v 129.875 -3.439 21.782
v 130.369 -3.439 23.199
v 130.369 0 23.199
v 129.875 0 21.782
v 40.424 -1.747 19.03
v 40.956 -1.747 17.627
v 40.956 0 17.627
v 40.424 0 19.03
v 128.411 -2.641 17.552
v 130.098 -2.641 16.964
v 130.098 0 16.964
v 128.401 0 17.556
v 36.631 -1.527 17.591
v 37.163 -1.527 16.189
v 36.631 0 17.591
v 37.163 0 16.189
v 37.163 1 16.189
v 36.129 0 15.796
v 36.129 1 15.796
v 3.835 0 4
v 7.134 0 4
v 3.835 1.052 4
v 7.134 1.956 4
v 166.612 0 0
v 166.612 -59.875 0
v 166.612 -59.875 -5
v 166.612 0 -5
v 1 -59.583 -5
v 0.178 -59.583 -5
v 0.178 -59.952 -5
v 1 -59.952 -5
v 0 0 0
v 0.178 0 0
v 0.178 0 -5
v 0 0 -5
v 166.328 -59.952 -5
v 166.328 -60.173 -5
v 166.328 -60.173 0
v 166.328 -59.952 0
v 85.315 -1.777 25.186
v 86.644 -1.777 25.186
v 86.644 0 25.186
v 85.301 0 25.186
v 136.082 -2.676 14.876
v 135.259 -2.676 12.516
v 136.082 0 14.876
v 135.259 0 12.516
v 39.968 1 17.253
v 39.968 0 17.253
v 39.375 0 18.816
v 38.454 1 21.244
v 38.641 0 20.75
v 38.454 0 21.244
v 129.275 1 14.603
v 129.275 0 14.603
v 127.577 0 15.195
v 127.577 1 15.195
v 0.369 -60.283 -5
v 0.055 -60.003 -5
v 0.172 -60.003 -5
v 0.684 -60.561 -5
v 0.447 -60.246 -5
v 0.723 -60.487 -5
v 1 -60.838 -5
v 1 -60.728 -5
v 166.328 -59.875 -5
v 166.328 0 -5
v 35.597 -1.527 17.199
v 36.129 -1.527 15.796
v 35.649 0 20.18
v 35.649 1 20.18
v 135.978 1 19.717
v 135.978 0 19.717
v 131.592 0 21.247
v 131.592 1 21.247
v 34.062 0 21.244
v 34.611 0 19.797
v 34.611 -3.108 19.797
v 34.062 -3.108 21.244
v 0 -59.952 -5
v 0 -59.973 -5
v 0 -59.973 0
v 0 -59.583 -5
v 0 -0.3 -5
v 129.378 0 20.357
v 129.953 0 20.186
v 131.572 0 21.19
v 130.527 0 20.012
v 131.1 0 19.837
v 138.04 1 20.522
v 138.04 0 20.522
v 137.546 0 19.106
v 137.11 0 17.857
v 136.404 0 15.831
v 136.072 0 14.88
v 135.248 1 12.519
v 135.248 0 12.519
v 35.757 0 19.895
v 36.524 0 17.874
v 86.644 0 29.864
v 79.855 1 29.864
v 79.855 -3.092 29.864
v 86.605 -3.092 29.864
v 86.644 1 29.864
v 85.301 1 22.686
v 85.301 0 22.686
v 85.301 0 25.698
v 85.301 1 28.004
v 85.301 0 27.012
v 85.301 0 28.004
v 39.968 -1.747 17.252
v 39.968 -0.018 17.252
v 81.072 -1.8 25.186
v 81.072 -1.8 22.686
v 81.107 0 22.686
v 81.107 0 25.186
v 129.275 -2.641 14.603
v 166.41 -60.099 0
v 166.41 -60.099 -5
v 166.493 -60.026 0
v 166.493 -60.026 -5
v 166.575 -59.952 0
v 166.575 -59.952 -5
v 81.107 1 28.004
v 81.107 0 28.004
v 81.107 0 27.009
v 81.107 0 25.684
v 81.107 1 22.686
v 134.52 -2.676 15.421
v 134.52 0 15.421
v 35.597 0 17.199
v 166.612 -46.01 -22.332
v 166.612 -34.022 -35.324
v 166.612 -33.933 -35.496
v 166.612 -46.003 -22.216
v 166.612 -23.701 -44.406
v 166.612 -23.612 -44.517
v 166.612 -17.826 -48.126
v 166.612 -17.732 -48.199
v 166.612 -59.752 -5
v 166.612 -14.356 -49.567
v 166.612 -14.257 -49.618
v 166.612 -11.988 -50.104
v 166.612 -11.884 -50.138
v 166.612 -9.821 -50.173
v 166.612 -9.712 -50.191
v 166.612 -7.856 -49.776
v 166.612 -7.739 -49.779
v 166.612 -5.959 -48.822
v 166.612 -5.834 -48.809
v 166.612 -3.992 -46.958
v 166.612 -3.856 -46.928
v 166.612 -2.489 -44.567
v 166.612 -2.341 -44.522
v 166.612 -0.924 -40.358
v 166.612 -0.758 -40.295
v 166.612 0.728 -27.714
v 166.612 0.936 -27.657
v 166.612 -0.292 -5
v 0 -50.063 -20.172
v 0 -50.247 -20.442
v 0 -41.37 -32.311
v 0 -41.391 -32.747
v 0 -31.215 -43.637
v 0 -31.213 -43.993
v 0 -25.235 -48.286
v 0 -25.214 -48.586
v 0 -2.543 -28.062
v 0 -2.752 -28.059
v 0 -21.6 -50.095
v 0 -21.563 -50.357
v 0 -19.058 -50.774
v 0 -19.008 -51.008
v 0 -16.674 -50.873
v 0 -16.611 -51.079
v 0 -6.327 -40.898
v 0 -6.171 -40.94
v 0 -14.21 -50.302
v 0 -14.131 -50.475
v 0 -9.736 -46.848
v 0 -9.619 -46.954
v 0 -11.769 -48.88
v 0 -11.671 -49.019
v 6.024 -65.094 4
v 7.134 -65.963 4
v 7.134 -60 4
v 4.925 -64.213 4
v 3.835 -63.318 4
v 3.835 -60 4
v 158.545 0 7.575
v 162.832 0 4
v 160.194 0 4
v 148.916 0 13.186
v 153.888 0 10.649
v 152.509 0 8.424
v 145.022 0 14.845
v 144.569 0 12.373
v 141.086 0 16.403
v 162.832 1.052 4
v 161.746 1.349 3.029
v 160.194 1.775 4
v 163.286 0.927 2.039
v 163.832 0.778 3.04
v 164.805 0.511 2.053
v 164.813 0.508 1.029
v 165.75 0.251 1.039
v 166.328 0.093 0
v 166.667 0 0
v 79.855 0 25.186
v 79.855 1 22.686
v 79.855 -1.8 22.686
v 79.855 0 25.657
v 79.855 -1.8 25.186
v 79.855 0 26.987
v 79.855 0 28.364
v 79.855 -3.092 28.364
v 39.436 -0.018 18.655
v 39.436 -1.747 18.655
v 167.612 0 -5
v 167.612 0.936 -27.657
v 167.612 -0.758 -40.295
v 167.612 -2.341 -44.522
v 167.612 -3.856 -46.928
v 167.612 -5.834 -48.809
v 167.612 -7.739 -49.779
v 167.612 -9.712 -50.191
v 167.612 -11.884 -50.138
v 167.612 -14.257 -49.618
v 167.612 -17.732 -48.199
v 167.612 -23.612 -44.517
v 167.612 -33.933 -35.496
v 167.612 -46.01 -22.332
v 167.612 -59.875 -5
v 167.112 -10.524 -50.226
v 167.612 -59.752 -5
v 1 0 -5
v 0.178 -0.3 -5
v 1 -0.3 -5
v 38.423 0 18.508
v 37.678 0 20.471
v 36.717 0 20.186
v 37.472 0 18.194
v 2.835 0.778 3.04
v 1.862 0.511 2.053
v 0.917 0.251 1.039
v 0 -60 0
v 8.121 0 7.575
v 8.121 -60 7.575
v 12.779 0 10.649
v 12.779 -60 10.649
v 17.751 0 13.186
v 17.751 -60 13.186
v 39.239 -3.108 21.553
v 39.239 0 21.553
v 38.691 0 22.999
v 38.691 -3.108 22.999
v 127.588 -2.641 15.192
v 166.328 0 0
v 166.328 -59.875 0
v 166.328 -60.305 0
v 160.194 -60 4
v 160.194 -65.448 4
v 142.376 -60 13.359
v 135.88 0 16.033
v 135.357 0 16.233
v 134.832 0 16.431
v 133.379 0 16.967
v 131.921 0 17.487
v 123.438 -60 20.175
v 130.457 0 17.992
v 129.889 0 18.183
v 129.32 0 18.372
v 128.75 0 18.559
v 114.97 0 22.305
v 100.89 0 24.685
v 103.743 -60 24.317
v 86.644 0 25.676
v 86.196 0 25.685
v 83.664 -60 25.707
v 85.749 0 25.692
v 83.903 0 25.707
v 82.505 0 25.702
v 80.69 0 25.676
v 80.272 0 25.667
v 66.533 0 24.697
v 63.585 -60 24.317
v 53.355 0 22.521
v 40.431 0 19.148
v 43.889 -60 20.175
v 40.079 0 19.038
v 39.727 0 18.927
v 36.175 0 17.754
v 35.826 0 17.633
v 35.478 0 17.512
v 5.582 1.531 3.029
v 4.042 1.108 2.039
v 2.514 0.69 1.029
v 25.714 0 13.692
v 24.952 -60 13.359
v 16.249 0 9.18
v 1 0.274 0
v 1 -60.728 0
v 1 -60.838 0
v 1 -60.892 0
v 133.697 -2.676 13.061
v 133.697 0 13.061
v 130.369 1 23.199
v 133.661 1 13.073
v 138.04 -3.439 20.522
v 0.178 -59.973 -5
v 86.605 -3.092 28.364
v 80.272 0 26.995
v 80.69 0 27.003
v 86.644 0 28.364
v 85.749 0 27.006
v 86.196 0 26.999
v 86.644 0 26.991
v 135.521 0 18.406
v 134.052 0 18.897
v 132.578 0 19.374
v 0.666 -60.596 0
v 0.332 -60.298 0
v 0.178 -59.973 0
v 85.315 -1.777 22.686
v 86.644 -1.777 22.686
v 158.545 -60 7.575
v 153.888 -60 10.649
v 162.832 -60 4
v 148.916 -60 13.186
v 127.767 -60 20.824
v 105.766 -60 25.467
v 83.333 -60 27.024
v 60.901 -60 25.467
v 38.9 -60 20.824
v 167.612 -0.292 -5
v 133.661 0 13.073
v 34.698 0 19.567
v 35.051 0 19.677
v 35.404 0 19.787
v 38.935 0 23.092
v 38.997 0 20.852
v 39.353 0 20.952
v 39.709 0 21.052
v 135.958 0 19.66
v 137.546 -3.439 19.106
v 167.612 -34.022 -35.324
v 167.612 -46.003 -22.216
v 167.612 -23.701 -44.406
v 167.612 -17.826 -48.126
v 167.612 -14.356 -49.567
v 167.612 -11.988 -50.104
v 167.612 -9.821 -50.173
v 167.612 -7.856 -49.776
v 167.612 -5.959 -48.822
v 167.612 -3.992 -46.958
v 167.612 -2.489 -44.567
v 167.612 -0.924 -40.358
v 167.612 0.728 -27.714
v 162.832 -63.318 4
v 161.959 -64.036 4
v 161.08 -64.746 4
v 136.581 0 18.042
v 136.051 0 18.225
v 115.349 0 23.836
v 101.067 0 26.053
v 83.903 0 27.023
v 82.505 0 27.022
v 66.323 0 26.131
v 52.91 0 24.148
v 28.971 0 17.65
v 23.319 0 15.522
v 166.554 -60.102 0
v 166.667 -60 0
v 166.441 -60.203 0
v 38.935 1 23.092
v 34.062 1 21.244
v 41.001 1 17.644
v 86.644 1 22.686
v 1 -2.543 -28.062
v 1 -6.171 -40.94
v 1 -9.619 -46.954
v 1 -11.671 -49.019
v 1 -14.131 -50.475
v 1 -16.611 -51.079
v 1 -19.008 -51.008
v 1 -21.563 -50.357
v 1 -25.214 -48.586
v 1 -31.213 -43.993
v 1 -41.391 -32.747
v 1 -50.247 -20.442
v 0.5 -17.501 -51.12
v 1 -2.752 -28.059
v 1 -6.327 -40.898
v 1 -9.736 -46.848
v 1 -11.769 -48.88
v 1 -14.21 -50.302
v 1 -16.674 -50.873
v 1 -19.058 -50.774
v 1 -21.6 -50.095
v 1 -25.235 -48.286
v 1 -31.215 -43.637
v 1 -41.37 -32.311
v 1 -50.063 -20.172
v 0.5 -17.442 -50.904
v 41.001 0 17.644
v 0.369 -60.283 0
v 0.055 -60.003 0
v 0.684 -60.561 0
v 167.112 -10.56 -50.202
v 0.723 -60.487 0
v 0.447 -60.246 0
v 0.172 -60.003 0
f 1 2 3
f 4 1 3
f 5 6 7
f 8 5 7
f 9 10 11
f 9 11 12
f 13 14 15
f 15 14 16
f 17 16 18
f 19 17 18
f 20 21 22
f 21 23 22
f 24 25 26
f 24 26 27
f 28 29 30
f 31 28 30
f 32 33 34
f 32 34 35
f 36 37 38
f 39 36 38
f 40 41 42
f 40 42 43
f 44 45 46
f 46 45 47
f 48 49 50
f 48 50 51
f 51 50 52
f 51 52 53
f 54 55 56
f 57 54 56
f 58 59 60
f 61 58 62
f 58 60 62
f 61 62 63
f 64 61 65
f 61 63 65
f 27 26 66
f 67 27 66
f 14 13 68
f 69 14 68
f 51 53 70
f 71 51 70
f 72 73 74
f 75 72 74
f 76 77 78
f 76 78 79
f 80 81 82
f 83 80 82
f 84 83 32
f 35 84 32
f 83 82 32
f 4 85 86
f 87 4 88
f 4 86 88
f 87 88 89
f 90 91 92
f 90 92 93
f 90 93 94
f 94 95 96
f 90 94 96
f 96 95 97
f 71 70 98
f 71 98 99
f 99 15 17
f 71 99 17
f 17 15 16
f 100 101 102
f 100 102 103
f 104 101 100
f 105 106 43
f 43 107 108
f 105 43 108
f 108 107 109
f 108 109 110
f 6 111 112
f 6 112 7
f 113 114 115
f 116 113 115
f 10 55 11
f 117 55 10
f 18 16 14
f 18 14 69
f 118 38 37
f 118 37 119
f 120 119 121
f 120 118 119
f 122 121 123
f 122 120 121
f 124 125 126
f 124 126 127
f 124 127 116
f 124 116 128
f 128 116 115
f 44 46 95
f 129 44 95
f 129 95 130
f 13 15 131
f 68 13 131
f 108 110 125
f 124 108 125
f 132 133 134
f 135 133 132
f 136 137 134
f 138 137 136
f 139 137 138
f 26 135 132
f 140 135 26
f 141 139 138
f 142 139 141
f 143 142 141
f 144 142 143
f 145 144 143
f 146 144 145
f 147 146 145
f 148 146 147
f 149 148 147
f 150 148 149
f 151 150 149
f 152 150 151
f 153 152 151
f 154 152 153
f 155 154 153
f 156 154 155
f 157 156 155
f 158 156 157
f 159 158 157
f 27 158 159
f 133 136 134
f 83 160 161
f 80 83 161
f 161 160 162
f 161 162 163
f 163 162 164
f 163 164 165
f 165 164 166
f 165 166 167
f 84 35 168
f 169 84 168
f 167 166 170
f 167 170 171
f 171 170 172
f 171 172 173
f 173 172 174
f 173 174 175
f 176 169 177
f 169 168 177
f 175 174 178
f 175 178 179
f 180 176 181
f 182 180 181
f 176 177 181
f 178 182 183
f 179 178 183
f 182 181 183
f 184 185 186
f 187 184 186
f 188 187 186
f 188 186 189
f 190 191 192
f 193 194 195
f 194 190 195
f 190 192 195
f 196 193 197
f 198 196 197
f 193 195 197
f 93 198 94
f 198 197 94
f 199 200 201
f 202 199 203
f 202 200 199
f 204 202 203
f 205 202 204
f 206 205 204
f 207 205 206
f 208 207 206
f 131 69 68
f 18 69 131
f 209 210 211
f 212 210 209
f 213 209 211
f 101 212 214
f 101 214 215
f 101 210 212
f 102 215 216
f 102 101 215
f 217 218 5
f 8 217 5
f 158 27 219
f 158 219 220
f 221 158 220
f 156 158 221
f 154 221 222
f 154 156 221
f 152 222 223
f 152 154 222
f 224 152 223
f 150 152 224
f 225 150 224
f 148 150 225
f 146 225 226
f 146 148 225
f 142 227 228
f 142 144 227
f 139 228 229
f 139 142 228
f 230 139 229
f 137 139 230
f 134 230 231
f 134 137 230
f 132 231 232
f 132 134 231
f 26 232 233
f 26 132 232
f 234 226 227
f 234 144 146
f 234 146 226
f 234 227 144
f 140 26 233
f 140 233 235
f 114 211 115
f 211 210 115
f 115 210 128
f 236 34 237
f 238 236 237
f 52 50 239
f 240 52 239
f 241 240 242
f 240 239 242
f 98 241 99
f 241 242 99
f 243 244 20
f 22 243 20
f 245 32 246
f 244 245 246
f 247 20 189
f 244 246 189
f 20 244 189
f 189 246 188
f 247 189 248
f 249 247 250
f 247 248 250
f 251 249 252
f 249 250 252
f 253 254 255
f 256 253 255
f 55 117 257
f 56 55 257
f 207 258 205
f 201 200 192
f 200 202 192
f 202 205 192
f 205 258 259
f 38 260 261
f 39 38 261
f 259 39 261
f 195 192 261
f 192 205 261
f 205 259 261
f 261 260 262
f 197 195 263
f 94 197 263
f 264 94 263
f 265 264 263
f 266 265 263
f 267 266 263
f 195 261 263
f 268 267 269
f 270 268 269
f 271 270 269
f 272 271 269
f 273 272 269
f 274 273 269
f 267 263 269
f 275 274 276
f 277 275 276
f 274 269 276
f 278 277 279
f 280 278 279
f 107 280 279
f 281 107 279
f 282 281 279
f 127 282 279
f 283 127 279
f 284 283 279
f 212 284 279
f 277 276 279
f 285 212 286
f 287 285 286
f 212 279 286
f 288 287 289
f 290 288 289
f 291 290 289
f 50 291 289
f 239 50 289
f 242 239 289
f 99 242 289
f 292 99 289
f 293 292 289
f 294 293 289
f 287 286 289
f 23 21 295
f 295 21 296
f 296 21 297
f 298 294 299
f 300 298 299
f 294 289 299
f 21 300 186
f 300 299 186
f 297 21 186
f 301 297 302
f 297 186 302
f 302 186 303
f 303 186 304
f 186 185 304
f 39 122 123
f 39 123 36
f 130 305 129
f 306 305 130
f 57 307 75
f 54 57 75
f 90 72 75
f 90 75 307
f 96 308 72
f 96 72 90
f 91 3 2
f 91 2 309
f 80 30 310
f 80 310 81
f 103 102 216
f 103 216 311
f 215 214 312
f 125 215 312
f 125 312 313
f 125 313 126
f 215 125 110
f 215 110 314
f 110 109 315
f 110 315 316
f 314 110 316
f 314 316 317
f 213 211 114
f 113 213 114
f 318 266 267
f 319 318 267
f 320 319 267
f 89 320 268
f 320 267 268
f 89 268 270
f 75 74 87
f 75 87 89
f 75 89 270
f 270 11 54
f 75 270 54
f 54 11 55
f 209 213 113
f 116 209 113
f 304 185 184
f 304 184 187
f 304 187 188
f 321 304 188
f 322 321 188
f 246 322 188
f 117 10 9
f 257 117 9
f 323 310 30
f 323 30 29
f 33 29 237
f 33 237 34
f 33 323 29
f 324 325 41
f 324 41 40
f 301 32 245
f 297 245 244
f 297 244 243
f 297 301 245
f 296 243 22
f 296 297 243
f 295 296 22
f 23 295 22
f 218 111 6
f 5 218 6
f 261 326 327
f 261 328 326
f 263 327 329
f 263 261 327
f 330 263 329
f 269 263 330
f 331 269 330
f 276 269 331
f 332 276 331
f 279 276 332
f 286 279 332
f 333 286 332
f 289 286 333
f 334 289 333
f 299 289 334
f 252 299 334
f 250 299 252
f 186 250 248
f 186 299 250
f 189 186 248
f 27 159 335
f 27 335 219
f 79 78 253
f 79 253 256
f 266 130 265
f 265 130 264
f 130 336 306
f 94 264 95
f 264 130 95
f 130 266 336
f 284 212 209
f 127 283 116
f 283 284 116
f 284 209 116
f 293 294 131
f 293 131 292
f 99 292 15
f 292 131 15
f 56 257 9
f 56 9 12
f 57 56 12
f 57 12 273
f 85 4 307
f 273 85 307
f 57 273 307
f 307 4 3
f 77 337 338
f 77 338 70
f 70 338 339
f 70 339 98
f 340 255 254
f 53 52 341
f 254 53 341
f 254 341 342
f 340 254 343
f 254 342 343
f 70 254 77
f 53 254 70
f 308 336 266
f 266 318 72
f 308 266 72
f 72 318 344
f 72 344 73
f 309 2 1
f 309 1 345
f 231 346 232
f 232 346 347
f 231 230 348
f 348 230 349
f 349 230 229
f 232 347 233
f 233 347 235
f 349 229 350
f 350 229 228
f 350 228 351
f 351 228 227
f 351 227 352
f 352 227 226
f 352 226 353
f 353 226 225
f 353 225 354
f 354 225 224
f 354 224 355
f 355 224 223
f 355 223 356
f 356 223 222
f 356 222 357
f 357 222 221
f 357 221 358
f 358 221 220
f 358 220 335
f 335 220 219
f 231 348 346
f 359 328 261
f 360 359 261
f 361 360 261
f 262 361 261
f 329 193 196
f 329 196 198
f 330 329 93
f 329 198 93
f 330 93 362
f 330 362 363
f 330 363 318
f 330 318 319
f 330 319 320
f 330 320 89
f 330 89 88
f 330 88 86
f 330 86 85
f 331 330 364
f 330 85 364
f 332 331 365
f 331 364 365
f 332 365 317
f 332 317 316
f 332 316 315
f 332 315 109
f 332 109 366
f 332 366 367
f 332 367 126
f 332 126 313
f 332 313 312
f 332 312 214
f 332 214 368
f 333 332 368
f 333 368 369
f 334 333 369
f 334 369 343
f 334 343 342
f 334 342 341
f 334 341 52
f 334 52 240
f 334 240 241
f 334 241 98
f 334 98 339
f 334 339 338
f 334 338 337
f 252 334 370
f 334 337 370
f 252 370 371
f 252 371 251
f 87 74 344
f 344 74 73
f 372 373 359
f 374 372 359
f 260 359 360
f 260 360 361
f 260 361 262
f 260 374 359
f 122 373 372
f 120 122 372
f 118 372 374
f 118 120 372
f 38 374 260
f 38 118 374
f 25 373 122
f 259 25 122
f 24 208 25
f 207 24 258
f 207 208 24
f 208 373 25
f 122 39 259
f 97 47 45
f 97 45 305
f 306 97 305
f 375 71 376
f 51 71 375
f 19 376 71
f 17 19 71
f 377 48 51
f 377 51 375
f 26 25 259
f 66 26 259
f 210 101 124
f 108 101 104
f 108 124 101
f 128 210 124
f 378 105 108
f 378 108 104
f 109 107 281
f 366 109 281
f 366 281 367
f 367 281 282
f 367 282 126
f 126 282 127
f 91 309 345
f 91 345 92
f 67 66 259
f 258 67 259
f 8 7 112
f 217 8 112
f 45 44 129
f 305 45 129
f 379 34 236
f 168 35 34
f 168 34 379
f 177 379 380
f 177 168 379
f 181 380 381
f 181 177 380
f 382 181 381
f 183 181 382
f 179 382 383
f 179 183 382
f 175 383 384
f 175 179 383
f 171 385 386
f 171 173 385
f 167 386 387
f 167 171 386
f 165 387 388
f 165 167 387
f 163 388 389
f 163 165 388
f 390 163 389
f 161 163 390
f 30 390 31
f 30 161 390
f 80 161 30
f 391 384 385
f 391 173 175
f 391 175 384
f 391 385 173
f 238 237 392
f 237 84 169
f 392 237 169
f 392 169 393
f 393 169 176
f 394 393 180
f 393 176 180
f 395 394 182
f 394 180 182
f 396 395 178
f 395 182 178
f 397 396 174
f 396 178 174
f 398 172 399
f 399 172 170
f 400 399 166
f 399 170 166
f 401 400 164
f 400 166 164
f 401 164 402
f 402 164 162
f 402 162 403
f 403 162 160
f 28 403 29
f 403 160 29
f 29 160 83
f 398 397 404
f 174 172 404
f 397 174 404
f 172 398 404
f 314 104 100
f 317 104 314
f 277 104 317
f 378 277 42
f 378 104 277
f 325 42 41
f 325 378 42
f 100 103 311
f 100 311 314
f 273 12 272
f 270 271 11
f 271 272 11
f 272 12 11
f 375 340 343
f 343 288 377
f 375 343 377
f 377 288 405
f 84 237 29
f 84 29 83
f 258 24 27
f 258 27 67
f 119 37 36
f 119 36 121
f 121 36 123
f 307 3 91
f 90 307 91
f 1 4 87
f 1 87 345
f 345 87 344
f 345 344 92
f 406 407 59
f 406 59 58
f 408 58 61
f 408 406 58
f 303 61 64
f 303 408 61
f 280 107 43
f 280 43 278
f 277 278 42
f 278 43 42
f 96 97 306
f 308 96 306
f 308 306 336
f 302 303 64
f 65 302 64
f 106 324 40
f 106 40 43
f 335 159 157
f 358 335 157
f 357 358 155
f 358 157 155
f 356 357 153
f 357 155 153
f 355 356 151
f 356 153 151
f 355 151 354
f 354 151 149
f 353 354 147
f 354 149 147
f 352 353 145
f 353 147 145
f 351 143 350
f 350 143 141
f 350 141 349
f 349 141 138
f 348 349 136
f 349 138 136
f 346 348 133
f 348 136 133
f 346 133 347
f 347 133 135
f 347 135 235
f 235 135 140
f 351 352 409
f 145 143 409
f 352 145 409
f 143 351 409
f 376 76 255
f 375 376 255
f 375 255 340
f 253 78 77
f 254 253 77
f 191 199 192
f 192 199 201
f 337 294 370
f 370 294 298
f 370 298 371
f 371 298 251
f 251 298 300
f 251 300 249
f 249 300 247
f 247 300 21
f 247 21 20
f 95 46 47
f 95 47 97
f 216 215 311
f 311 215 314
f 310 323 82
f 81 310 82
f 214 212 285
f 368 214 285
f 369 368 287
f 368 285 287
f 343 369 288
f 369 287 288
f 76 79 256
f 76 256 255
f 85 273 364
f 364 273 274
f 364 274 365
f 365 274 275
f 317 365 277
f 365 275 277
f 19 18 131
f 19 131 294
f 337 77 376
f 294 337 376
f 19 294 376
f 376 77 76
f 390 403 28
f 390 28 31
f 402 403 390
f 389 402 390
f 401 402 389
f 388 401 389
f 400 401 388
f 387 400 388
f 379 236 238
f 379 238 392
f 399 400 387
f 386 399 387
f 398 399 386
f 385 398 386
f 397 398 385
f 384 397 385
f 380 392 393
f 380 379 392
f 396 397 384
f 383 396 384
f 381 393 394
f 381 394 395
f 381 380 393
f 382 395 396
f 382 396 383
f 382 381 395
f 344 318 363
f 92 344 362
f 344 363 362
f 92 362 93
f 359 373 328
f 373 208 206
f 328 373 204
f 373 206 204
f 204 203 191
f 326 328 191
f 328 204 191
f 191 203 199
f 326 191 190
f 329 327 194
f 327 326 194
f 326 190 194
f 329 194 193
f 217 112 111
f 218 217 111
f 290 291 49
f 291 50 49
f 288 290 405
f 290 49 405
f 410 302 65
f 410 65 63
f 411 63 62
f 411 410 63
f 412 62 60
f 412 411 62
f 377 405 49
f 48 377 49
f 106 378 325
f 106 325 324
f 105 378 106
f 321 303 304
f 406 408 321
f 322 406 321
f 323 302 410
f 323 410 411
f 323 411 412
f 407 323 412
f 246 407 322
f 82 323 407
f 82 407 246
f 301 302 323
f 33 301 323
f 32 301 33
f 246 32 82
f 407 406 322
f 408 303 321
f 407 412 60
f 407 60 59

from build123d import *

# Parameters (mm, degrees)
SALIENTE_EXTRUIR1_DEPTH    = 4
SALIENTE_EXTRUIR2_DEPTH    = 60
CROQUIS3_W                 = 0.289029692
CROQUIS3_H                 = 59.87540196
CROQUIS3_W_2               = 0.177592091
CROQUIS3_H_2               = 59.973158088
SALIENTE_EXTRUIR3_DEPTH    = 5
SALIENTE_EXTRUIR4_DEPTH    = 5
REDONDEO1_R                = 50
REDONDEO2_R                = 50
SALIENTE_EXTRUIR5_DEPTH    = 1
SALIENTE_EXTRUIR6_DEPTH    = 1
CORTAR_EXTRUIR6_DEPTH      = 100
CORTAR_EXTRUIR6_DEPTH_BACK = 100
SALIENTE_EXTRUIR8_DEPTH    = 1
CROQUIS14_W                = 1.546959861
CROQUIS14_H                = 3.108298136
SALIENTE_EXTRUIR9_DEPTH    = 4.95
CROQUIS17_W                = 1.106278156
CROQUIS17_H                = 1.527135833
SALIENTE_EXTRUIR10_DEPTH   = 1.5
SALIENTE_EXTRUIR11_DEPTH   = 1.5
SALIENTE_EXTRUIR20_DEPTH   = 1
SALIENTE_EXTRUIR21_DEPTH   = 2.5
SALIENTE_EXTRUIR22_DEPTH   = 2.5
SALIENTE_EXTRUIR23_DEPTH   = 1.5
SALIENTE_EXTRUIR24_DEPTH   = 1
CROQUIS25_W                = 8.124604313
CROQUIS25_H                = 3.439267379
SALIENTE_EXTRUIR26_DEPTH   = 1.5
CROQUIS26_W                = 1.653966606
CROQUIS26_H                = 2.676005595
SALIENTE_EXTRUIR27_DEPTH   = 2.5
SALIENTE_EXTRUIR28_DEPTH   = 2.5


with BuildPart() as part:
    # Croquis1 → Saliente-Extruir1 (new body)
    with BuildSketch(Plane.XY):
        with BuildLine():
            Line((0, 0), (83.333477934, 22.852667115))
            Line((83.333477934, 22.852667115), (166.666955868, 0))
            Line((166.666955868, 0), (166.666955868, -60))
            ThreePointArc((166.666955868, -60), (83.333477934, -92.017871072), (0, -60))
            Line((0, -60), (0, 0))
        make_face()
    extrude(amount=SALIENTE_EXTRUIR1_DEPTH)

    # Croquis2 → Saliente-Extruir2 (add)
    with BuildSketch(Plane(origin=(0, 0, 0), x_dir=(1, 0, 0), z_dir=(0, 1, 0))):
        with BuildLine():
            Line((0, -4), (166.666955868, -4))
            ThreePointArc((166.666955868, -4), (83.333477934, -27.024341585), (0, -4))
        make_face()
    extrude(amount=-SALIENTE_EXTRUIR2_DEPTH)

    # Croquis3 → Saliente-Extruir3 (add)
    with BuildSketch(Plane(origin=(0, 0, 0), x_dir=(-1, 0, 0), z_dir=(0, 0, -1))):
        with Locations((-166.467895628, -29.93770098)):
            Rectangle(CROQUIS3_W, CROQUIS3_H)
        with Locations((-0.088843275, -29.986579044)):
            Rectangle(CROQUIS3_W_2, CROQUIS3_H_2)
    extrude(amount=SALIENTE_EXTRUIR3_DEPTH)

    # Croquis4 → Saliente-Extruir4 (add)
    with BuildSketch(Plane(origin=(0, 0, 0), x_dir=(-1, 0, 0), z_dir=(0, 0, -1))):
        with BuildLine():
            Line((-166.575051433, -59.952097452), (-166.327771804, -59.952097452))
            ThreePointArc((-166.327771804, -59.952097452), (-83.259391035, -91.42682448), (-0.171692336, -60.003128804))
            Line((-0.171692336, -60.003128804), (-0.054856283, -60.003128804))
            ThreePointArc((-0.054856283, -60.003128804), (-83.324689996, -91.747566021), (-166.575051433, -59.952097452))
        make_face()
    extrude(amount=SALIENTE_EXTRUIR4_DEPTH)

    # Redondeo1
    # the kernel refuses this fillet: 50 mm, written as the material it takes off along each edge
    with BuildSketch(Plane(origin=(166.666955868, 49.966304068, 4), x_dir=(0, 0, -1), z_dir=(0, -1, 0))) as redondeo1_piece_1:
        with BuildLine():
            CenterArc((36.551638367, -37.952481337), REDONDEO1_R, 130.619513434, 25.549773404)
            Line((-9.185522516, -17.750696405), (-10.100265733, -17.346660707))
            ThreePointArc((-10.100265733, -17.346660707), (-5.754361432, -8.274250403), (-0.858153989, 0.513392375))
            Line((-0.858153989, 0.513392375), (0, 1))
            ThreePointArc((0, 1), (2, 1), (3.348967233, 0.759049627))
            Line((3.348967233, 0.759049627), (4, 0))
        make_face()
    extrude(amount=159.932608137, mode=Mode.SUBTRACT)

    # Redondeo2
    # the kernel refuses this fillet: 50 mm, written as the material it takes off along each edge
    with BuildSketch(Plane(origin=(0, -109.966304068, 4), x_dir=(0, 0, -1), z_dir=(0, 1, 0))) as redondeo2_piece_1:
        with BuildLine():
            CenterArc((36.551638367, -37.952481337), REDONDEO2_R, 130.619513434, 25.549773404)
            Line((-9.185522516, -17.750696405), (-10.100265733, -17.346660707))
            ThreePointArc((-10.100265733, -17.346660707), (-5.754361432, -8.274250403), (-0.858153989, 0.513392375))
            Line((-0.858153989, 0.513392375), (0, 1))
            ThreePointArc((0, 1), (2, 1), (3.348967233, 0.759049627))
            Line((3.348967233, 0.759049627), (4, 0))
        make_face()
    extrude(amount=159.932608137, mode=Mode.SUBTRACT)

    # Croquis6 → Saliente-Extruir5 (add)
    with BuildSketch(Plane(origin=(0, 0, 0), x_dir=(0, 0, -1), z_dir=(1, 0, 0))):
        with BuildLine():
            Line((5, 0), (5, -0.29960532))
            add(Edge.make_bspline(
                [(5, -0.29960532), (96.808979423, -4.943573918), (5, -59.582645774)],
                knots=[0, 0, 0, 1, 1, 1], degree=2))
            Line((5, -59.582645774), (5, -59.952097452))
            add(Edge.make_bspline(
                [(5, 0), (97.240633966, -5.026465085), (5, -59.952097452)],
                knots=[0, 0, 0, 1, 1, 1], degree=2))
        make_face()
    extrude(amount=SALIENTE_EXTRUIR5_DEPTH)

    # Croquis9 → Cortar-Extruir6 (cut, two sides: drawn at the far end of the back side and taken through both)
    with BuildSketch(Plane(origin=(0, 0, 0), x_dir=(1, 0, 0), z_dir=(0, 1, 0)).offset(-CORTAR_EXTRUIR6_DEPTH_BACK)):
        with BuildLine():
            Line((1, 5), (166.327771804, 5))
            Line((166.327771804, 5), (166.327771804, 0))
            ThreePointArc((166.327771804, 0), (83.663885902, -25.706781267), (1, 0))
            Line((1, 0), (1, 5))
        make_face()
    extrude(amount=CORTAR_EXTRUIR6_DEPTH + CORTAR_EXTRUIR6_DEPTH_BACK, mode=Mode.SUBTRACT)

    # Croquis11 → Saliente-Extruir8 (add)
    with BuildSketch(Plane(origin=(0, 0, 0), x_dir=(1, 0, 0), z_dir=(0, 1, 0))):
        Polygon((36.128583572, -15.796167366), (34.062264647, -21.243735439), (38.935063324, -23.092038385), (41.001382248, -17.644470312), (39.968222786, -17.25258224), (38.45433709, -21.243735439), (35.649065215, -20.179666797), (37.162950911, -16.188513598), align=None)
    extrude(amount=SALIENTE_EXTRUIR8_DEPTH)

    # Croquis14 → Saliente-Extruir9 (add)
    with BuildSketch(Plane(origin=(36.822366085, 0, 13.967104377), x_dir=(-0.3546542341205386, 0, 0.9349975263177835), z_dir=(-0.9349975263177834, 0, -0.35465423412053854))):
        with Locations((7.009033774, -1.554149068)):
            Rectangle(CROQUIS14_W, CROQUIS14_H)
    extrude(amount=-SALIENTE_EXTRUIR9_DEPTH)

    # Croquis17 → Saliente-Extruir10 (add)
    with BuildSketch(Plane(origin=(-0.693782513, 0, 1.829062989), x_dir=(-0.9349975263177834, 0, -0.3546542341205389), z_dir=(0.35465423412053887, 0, -0.9349975263177833))):
        with Locations((-39.935452986, -0.763567916)):
            Rectangle(CROQUIS17_W, CROQUIS17_H)
    extrude(amount=-SALIENTE_EXTRUIR10_DEPTH)

    # Croquis19 → Saliente-Extruir20 (add)
    with BuildSketch(Plane(origin=(0, 0, 0), x_dir=(1, 0, 0), z_dir=(0, 1, 0))):
        Polygon((81.107233495, -28.004030405), (81.107233495, -22.686499047), (79.854642746, -22.686499047), (79.854642746, -29.86379276), (86.643974636, -29.86379276), (86.643974636, -22.686499047), (85.30129239, -22.686499047), (85.30129239, -28.004030405), align=None)
    extrude(amount=SALIENTE_EXTRUIR20_DEPTH)

    # Croquis20 → Saliente-Extruir21 (add)
    with BuildSketch(Plane(origin=(0, 0, 22.686499047), x_dir=(-1, 0, 0), z_dir=(0, 0, -1))):
        Polygon((-86.643974636, 0), (-86.643974636, -1.776510708), (-85.314516973, -1.776510708), (-85.30129239, 0), align=None)
    extrude(amount=-SALIENTE_EXTRUIR21_DEPTH)

    # Croquis22 → Saliente-Extruir22 (add)
    with BuildSketch(Plane(origin=(0, 0, 22.686499047), x_dir=(-1, 0, 0), z_dir=(0, 0, -1))):
        Polygon((-79.854642746, 0), (-79.854642746, -1.799894924), (-81.071701167, -1.799894924), (-81.107233495, 0), align=None)
    extrude(amount=-SALIENTE_EXTRUIR22_DEPTH)

    # Croquis23 → Saliente-Extruir23 (add)
    with BuildSketch(Plane.XY.offset(29.86379276)):
        Polygon((79.854642746, 0), (79.854642746, -3.091551628), (86.604630452, -3.091551628), (86.643974636, 0), align=None)
    extrude(amount=-SALIENTE_EXTRUIR23_DEPTH)

    # Croquis24 → Saliente-Extruir24 (add)
    with BuildSketch(Plane(origin=(0, 0, 0), x_dir=(1, 0, 0), z_dir=(0, 1, 0))):
        Polygon((127.577085334, -15.195398317), (130.368867149, -23.198506187), (138.040120015, -20.522487745), (135.2483382, -12.519379875), (133.660709286, -13.073203915), (135.978252363, -19.716827403), (131.59226066, -21.246824508), (129.274717583, -14.603201021), align=None)
    extrude(amount=SALIENTE_EXTRUIR24_DEPTH)

    # Croquis25 → Saliente-Extruir26 (add)
    with BuildSketch(Plane(origin=(21.357778013, 0, 61.225630304), x_dir=(0.9442001814457763, 0, -0.3293721563182948), z_dir=(0.32937215631829475, 0, 0.9442001814457762))):
        with Locations((119.515668168, -1.71963369)):
            Rectangle(CROQUIS25_W, CROQUIS25_H)
    extrude(amount=-SALIENTE_EXTRUIR26_DEPTH)

    # Croquis26 → Saliente-Extruir27 (add)
    with BuildSketch(Plane(origin=(18.565996198, 0, 53.222522434), x_dir=(-0.9442001814457758, 0, 0.3293721563182962), z_dir=(-0.3293721563182962, 0, -0.9442001814457758))):
        with Locations((-122.761908505, -1.338002798)):
            Rectangle(CROQUIS26_W, CROQUIS26_H)
    extrude(amount=-SALIENTE_EXTRUIR27_DEPTH)

    # Croquis27 → Saliente-Extruir28 (add)
    with BuildSketch(Plane(origin=(18.565996198, 0, 53.222522434), x_dir=(-0.9442001814457753, 0, 0.3293721563182975), z_dir=(-0.3293721563182975, 0, -0.9442001814457753))):
        Polygon((-117.251323989, 0), (-117.251323989, -2.641002762), (-115.464919434, -2.641002762), (-115.453366011, 0), align=None)
    extrude(amount=-SALIENTE_EXTRUIR28_DEPTH)


with BuildPart() as body_2:
    # Croquis8 → Saliente-Extruir6 (new body)
    with BuildSketch(Plane(origin=(166.612410474, 0, 0), x_dir=(0, 0, -1), z_dir=(1, 0, 0))):
        with BuildLine():
            Line((5, -0.29177164), (5, 0))
            add(Edge.make_bspline(
                [(5, 0), (95.452044638, 8.889076333), (5, -59.87540196)],
                knots=[0, 0, 0, 1, 1, 1], degree=2))
            Line((5, -59.87540196), (5, -59.752239474))
            add(Edge.make_bspline(
                [(5, -0.29177164), (95.404420621, 8.902780741), (5, -59.752239474)],
                knots=[0, 0, 0, 1, 1, 1], degree=2))
        make_face()
    extrude(amount=SALIENTE_EXTRUIR6_DEPTH)


with BuildPart() as body_3:
    # Croquis18 → Saliente-Extruir11 (new body)
    with BuildSketch(Plane(origin=(-0.693782513, 0, 1.829062989), x_dir=(-0.9349975263177843, 0, -0.35465423412053654), z_dir=(0.3546542341205365, 0, -0.9349975263177842))):
        Polygon((-43.488385393, -0.018465758), (-43.488385393, -1.747366455), (-44.545407148, -1.747366455), (-44.545407148, 0), align=None)
    extrude(amount=-SALIENTE_EXTRUIR11_DEPTH)


solid = Compound([part.part, body_2.part, body_3.part])
